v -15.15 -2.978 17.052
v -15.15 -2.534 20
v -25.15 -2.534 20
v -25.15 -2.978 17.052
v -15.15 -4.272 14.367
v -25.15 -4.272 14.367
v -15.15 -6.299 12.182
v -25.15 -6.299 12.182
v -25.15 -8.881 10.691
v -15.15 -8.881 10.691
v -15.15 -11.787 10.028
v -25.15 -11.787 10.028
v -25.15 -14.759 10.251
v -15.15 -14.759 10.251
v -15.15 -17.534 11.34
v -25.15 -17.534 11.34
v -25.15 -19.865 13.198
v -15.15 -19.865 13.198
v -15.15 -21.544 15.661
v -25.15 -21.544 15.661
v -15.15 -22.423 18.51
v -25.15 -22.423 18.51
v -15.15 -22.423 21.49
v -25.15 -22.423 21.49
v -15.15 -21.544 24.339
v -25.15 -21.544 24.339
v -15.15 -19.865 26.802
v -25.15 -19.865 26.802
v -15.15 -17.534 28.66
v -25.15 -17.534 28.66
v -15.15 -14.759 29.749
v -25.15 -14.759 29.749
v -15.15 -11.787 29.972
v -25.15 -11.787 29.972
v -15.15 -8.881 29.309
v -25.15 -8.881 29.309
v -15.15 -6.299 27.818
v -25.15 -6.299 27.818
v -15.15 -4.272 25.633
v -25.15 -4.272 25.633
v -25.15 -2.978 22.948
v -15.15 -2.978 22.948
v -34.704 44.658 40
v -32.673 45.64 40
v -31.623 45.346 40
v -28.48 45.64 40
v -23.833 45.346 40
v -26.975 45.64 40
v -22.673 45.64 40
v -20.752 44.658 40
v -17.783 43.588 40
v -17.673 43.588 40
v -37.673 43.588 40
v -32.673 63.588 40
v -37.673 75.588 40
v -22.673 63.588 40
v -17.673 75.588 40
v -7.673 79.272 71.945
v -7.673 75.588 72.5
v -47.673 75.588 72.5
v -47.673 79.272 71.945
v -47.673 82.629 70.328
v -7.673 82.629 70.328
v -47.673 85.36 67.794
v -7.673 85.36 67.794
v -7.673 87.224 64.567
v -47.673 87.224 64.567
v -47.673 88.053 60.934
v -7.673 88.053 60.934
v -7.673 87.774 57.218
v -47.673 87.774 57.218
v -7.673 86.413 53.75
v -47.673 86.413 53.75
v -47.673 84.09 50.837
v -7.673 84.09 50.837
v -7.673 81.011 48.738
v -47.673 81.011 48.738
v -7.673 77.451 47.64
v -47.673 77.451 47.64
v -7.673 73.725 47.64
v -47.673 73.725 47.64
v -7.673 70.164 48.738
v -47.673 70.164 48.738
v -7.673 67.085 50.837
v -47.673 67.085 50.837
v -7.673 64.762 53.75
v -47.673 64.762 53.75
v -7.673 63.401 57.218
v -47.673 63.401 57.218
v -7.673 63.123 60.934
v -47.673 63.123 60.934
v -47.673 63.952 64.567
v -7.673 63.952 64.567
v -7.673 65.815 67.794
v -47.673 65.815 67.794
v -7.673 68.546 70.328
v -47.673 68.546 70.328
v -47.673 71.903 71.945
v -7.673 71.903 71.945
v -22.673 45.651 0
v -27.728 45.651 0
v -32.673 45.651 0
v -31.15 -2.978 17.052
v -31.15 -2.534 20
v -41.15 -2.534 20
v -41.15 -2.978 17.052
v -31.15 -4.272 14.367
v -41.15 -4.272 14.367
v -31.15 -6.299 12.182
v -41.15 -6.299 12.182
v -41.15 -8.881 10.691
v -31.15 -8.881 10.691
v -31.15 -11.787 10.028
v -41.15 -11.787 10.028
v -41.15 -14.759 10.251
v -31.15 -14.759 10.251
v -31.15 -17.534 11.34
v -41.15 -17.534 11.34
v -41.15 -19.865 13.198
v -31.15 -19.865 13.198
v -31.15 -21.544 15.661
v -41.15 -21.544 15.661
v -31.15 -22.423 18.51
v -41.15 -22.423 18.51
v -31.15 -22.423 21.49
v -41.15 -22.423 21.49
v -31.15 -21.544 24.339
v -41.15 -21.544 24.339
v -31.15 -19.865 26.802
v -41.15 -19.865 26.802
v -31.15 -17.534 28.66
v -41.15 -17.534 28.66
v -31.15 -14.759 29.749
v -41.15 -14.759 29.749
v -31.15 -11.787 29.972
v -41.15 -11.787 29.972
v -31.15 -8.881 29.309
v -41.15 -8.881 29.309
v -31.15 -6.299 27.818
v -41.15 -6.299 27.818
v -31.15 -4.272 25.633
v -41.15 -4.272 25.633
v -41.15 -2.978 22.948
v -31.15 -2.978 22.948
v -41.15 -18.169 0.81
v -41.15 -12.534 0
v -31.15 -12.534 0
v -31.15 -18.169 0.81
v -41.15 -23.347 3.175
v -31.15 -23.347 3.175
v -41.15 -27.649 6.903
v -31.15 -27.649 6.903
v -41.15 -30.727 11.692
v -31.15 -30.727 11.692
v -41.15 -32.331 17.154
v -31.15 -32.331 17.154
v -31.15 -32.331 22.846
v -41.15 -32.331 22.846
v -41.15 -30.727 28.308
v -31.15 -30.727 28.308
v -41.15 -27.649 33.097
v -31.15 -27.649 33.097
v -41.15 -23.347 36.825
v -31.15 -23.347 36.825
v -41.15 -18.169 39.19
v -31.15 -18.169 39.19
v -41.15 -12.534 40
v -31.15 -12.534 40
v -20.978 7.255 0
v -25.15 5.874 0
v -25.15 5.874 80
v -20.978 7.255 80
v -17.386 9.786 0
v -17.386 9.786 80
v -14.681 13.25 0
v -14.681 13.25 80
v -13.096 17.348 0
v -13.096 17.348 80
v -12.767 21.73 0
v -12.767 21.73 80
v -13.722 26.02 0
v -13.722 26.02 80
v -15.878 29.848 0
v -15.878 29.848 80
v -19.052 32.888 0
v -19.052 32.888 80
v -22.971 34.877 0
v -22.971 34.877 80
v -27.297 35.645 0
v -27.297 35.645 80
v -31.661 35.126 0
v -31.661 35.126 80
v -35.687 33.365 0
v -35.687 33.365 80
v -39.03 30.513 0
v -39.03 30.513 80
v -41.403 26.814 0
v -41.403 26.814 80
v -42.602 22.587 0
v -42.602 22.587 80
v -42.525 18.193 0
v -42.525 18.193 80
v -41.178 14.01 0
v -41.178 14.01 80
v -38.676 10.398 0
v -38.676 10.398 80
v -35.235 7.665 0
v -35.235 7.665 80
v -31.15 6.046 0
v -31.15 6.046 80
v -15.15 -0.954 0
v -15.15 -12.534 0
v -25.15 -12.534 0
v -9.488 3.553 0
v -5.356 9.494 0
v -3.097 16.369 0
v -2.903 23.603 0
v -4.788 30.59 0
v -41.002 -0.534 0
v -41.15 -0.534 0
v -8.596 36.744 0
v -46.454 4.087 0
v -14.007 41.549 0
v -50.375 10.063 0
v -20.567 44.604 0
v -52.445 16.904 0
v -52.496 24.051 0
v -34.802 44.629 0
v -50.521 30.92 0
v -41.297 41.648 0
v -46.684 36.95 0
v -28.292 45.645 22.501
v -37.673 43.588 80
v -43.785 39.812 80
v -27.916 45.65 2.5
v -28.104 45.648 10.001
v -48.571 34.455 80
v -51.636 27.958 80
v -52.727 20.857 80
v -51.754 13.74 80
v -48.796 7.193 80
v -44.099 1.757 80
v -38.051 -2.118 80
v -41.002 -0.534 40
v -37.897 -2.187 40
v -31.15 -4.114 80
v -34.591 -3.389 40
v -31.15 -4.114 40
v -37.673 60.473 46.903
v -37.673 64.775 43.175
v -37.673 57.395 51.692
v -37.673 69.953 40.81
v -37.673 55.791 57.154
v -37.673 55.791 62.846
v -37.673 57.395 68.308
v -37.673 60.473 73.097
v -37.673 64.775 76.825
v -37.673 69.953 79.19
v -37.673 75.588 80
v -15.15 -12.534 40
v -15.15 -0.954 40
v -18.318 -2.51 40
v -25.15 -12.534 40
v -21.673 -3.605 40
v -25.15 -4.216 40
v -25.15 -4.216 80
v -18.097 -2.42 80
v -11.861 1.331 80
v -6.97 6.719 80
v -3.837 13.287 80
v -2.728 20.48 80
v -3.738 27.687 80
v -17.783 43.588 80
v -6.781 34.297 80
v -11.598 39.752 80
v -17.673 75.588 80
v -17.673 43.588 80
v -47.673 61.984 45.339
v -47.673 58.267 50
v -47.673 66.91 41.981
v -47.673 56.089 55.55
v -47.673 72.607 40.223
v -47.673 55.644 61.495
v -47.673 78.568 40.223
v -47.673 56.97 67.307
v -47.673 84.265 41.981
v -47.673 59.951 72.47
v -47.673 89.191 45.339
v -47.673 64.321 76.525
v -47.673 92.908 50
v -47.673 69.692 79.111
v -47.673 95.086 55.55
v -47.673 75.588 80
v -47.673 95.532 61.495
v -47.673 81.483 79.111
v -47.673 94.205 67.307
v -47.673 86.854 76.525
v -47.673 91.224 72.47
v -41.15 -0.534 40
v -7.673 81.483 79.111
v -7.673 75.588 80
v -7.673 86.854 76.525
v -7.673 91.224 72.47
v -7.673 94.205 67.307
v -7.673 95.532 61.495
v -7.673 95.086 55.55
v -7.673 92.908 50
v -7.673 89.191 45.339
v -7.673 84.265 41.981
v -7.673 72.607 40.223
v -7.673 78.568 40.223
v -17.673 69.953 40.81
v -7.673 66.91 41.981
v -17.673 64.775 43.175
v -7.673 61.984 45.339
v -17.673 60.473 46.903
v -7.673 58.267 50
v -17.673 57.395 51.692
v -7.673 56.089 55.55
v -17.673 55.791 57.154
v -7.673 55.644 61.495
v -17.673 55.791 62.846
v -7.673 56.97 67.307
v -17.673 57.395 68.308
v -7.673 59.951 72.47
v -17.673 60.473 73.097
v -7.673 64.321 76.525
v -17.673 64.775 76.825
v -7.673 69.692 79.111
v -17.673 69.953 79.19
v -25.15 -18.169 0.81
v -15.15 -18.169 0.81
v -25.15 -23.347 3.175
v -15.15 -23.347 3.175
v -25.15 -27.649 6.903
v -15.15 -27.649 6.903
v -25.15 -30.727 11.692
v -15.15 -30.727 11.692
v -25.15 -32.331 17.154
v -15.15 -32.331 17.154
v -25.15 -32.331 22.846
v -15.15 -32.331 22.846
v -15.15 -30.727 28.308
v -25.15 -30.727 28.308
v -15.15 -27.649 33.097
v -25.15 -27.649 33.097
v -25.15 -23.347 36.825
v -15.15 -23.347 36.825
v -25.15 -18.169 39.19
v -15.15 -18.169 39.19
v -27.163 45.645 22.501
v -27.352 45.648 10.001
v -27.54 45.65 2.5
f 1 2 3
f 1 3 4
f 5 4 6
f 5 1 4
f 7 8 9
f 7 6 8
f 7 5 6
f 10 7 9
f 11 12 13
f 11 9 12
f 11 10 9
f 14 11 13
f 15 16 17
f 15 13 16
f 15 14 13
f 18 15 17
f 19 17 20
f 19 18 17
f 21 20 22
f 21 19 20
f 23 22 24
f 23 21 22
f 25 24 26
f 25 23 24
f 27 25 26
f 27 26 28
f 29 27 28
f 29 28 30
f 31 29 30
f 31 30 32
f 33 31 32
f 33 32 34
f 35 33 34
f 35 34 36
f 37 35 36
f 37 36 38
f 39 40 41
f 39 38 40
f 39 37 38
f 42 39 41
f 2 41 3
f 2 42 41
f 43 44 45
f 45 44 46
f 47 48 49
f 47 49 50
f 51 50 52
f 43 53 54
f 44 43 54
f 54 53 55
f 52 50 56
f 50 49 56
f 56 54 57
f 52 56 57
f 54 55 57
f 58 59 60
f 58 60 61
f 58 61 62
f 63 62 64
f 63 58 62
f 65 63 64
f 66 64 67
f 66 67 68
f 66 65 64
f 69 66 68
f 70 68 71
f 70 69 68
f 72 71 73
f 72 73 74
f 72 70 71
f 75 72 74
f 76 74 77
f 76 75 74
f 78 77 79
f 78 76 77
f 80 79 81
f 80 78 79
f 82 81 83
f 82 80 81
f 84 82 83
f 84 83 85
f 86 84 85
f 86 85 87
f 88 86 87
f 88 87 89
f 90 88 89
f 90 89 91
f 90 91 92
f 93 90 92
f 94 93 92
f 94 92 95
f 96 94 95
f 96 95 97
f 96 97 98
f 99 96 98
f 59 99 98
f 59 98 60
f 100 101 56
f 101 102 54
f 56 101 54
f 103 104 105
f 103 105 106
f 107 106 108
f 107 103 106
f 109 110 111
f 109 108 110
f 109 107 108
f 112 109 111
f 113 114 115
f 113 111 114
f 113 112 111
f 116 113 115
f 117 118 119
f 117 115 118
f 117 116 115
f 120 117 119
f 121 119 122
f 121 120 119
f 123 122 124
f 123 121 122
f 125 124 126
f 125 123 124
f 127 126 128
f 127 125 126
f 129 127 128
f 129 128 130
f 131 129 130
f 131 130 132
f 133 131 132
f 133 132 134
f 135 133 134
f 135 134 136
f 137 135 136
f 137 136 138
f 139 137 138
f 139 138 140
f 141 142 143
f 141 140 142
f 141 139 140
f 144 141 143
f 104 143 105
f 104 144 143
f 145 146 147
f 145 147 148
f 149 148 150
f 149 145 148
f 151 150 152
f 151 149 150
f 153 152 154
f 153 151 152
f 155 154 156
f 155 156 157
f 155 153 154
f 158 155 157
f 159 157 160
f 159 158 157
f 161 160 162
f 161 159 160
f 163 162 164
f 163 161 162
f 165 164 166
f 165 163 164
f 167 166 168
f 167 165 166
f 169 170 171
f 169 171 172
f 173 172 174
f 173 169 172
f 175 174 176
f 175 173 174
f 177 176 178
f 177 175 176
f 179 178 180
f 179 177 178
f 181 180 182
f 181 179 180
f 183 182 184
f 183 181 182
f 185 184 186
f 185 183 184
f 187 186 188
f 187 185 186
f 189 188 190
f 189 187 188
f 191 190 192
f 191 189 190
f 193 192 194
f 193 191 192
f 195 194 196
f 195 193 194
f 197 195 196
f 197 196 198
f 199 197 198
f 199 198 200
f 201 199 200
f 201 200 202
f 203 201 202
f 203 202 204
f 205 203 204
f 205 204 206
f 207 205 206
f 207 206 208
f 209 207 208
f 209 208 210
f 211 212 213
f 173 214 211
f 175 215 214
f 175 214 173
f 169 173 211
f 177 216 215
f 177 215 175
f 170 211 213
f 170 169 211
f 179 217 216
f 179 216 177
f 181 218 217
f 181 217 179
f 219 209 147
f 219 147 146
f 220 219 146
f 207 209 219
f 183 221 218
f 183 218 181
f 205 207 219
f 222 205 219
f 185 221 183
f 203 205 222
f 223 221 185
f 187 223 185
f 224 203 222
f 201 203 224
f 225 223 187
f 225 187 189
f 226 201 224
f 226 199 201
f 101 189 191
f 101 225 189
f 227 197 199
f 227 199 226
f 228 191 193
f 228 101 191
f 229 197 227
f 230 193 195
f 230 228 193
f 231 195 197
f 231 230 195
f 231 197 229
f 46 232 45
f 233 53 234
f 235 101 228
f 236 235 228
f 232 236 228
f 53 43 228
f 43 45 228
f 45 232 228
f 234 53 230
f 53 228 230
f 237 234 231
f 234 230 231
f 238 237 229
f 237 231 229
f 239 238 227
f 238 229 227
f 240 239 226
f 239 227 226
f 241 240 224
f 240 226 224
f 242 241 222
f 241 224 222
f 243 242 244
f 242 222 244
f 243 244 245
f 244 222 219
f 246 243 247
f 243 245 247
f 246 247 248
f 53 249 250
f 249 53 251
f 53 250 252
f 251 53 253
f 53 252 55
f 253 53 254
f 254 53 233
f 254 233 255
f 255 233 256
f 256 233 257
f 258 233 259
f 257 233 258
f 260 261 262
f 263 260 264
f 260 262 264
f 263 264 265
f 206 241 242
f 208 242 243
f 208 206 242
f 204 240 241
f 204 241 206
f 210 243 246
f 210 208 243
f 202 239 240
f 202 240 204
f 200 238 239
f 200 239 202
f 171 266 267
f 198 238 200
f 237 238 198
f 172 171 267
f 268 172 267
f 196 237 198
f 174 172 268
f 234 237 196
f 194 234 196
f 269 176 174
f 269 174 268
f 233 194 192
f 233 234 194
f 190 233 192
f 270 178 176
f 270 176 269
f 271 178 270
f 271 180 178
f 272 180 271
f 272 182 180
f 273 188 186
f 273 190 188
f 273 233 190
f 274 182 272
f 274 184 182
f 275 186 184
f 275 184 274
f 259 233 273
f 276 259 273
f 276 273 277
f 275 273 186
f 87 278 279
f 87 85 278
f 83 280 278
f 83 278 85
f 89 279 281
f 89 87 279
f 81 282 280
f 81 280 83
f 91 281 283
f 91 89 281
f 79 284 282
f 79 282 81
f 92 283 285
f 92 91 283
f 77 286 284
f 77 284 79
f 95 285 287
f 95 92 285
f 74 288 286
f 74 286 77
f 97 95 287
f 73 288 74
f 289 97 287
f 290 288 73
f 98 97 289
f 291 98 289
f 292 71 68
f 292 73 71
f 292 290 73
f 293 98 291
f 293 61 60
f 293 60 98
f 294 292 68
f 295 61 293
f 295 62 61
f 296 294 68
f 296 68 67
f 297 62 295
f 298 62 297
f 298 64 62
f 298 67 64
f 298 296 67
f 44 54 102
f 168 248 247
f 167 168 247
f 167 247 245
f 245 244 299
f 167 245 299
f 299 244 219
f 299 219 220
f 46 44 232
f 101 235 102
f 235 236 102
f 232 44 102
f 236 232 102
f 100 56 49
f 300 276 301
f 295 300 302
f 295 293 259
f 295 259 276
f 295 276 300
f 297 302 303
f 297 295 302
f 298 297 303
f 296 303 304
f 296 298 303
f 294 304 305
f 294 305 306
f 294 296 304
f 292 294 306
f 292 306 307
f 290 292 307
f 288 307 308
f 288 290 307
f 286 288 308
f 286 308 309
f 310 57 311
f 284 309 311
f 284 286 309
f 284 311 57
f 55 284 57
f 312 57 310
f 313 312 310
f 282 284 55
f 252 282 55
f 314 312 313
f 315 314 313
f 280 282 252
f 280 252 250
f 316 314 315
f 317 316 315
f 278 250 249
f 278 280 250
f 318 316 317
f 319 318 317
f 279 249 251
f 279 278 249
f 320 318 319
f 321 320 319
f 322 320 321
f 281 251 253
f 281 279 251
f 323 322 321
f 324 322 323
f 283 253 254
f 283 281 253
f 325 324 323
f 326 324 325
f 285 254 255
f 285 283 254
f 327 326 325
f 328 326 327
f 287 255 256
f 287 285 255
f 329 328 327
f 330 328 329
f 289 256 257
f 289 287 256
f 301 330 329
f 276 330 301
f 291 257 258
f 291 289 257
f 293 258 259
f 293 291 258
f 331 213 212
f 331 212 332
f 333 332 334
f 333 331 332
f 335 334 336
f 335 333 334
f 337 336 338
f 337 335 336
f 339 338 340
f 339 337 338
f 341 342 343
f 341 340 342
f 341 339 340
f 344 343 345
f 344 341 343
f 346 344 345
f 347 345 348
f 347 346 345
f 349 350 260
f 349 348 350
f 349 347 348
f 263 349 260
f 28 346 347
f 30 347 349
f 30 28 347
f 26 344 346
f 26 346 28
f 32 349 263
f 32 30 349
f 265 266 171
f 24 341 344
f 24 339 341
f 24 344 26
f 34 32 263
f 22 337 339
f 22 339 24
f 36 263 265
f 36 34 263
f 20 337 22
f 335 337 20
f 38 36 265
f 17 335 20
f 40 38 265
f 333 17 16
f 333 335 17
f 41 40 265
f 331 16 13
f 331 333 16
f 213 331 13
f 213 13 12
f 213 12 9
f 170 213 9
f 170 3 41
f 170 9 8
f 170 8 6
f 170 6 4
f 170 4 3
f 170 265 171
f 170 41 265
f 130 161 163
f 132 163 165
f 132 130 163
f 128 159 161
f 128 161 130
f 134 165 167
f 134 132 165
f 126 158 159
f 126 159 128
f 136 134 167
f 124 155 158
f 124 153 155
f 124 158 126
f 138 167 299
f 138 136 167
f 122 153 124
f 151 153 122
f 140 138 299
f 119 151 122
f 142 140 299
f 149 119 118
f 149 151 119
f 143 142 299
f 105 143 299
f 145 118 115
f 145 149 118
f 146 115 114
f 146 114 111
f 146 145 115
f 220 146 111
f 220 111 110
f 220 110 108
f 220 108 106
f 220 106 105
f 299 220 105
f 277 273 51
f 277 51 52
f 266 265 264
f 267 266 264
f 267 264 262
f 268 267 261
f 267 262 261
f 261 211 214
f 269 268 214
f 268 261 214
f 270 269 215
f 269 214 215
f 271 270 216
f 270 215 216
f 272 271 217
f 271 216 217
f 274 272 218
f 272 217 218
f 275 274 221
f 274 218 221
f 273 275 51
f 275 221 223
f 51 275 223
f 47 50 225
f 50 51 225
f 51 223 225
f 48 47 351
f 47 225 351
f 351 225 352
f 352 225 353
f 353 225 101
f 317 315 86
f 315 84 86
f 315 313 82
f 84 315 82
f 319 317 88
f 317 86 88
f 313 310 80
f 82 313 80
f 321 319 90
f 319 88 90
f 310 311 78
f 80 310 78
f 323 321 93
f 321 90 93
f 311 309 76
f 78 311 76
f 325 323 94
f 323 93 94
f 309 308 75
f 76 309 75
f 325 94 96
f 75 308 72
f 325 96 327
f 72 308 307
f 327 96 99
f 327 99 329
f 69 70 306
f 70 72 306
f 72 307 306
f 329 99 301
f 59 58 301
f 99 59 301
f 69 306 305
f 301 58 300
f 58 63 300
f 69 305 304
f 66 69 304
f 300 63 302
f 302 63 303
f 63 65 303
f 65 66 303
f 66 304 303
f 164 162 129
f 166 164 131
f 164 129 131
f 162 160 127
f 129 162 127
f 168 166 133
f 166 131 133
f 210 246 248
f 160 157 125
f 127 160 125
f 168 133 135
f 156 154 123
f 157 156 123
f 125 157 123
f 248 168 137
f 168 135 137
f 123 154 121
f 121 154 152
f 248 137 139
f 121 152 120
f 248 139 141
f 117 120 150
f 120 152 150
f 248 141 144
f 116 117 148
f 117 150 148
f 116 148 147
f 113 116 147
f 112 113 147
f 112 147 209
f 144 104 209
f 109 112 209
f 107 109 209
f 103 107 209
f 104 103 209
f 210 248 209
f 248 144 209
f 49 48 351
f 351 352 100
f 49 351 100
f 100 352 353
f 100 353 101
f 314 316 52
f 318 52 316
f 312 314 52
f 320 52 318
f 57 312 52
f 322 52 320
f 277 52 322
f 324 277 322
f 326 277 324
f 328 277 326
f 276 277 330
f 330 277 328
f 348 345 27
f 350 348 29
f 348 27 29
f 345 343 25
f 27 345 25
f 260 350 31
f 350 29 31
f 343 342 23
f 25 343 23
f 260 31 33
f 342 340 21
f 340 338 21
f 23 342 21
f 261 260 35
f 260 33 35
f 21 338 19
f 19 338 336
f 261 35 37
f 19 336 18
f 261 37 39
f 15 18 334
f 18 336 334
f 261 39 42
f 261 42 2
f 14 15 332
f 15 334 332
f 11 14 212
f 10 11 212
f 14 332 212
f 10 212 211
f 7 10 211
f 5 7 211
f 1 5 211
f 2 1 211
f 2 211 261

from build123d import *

# Parameters (mm, degrees)
IZIM1_R                     = 25
IZIM1_R_2                   = 15
Y_KSEKLIK_EKSTR_ZYON1_DEPTH = 80
IZIM3_W                     = 26
IZIM3_H                     = 32
Y_KSEKLIK_EKSTR_ZYON3_DEPTH = 40
RADYUS2_RADIUS              = 20
RADYUS2_LENGTH              = 26
IZIM5_W                     = 6
IZIM5_H                     = 44.006307857
KES_EKSTR_ZYON1_DEPTH       = 107.133079222
KES_EKSTR_ZYON2_DEPTH       = 100.800958853
KES_EKSTR_ZYON2_DEPTH_BACK  = 100.800958853
IZIM7_R                     = 10
IZIM9_W                     = 20
IZIM9_H                     = 32
Y_KSEKLIK_EKSTR_ZYON4_DEPTH = 40
Y_KSEKLIK_EKSTR_ZYON5_DEPTH = 5
IZIM11_R                    = 20
IZIM11_R_2                  = 12.5
Y_KSEKLIK_EKSTR_ZYON6_DEPTH = 20
KES_EKSTR_ZYON3_DEPTH       = 130.453305469
KES_EKSTR_ZYON3_DEPTH_BACK  = 130.453305469
IZIM12_R                    = 12.5


with BuildPart() as part:
    # Çizim1 → Yükseklik-Ekstrüzyon1 (new body)
    with BuildSketch(Plane.XY):
        with Locations((-27.727849989, 20.650896384)):
            Circle(IZIM1_R)
        with Locations((-27.727849989, 20.650896384)):
            Circle(IZIM1_R_2, mode=Mode.SUBTRACT)
    extrude(amount=Y_KSEKLIK_EKSTR_ZYON1_DEPTH)

    # Çizim3 → Yükseklik-Ekstrüzyon3 (add)
    with BuildSketch(Plane(origin=(0, 0, 0), x_dir=(-1, 0, 0), z_dir=(0, 0, -1))):
        with Locations((28.149550203, -16.534219889)):
            Rectangle(IZIM3_W, IZIM3_H)
    extrude(amount=-Y_KSEKLIK_EKSTR_ZYON3_DEPTH)

    # Radyus2: full round fillet: the end face becomes a half cylinder, R = half its width
    radyus2_face = Plane((-28.149550203, -32.534219889, 20), x_dir=(-1, 0, 0), z_dir=(0, -1, 0))  # on the end face: x along it, z out of the body
    radyus2_slab = radyus2_face.offset(-RADYUS2_RADIUS / 2) * Box(RADYUS2_LENGTH, 2 * RADYUS2_RADIUS, RADYUS2_RADIUS, mode=Mode.PRIVATE)  # the body's end, R deep
    radyus2_round = Plane((-28.149550203, -12.534219889, 20), x_dir=(0, -1, 0), z_dir=(-1, 0, 0)) * Cylinder(RADYUS2_RADIUS, RADYUS2_LENGTH, mode=Mode.PRIVATE)  # its axis R under the face
    add(radyus2_slab - radyus2_round, mode=Mode.SUBTRACT)

    # Çizim5 → Kes-Ekstrüzyon1 (cut, through all)
    with BuildSketch(Plane(origin=(0, 0, 0), x_dir=(-1, 0, 0), z_dir=(0, 0, -1))):
        with Locations((28.149550203, -10.53106596)):
            Rectangle(IZIM5_W, IZIM5_H)
    extrude(amount=-KES_EKSTR_ZYON1_DEPTH, mode=Mode.SUBTRACT)

    # Çizim7 → Kes-Ekstrüzyon2 (cut, two sides: drawn at the far end of the back side and taken through both)
    with BuildSketch(Plane.ZY.offset(41.149550203).offset(-KES_EKSTR_ZYON2_DEPTH_BACK)):
        with Locations(Location((20, -12.534219889, 0), (0, 0, 90))):
            Circle(IZIM7_R)
    extrude(amount=KES_EKSTR_ZYON2_DEPTH + KES_EKSTR_ZYON2_DEPTH_BACK, mode=Mode.SUBTRACT)

    # Çizim9 → Yükseklik-Ekstrüzyon4 (add)
    with BuildSketch(Plane.XY.offset(80)):
        with Locations((-27.673094682, 59.587594228)):
            Rectangle(IZIM9_W, IZIM9_H)
    extrude(amount=-Y_KSEKLIK_EKSTR_ZYON4_DEPTH)

    # Çizim10 → Yükseklik-Ekstrüzyon5 (add, symmetric)
    with BuildSketch(Plane.ZY.offset(27.673094682)):
        Polygon((0, 45.650896384), (40, 63.587594228), (40, 45.639566476), align=None)
    extrude(amount=Y_KSEKLIK_EKSTR_ZYON5_DEPTH, both=True)

    # Çizim11 → Yükseklik-Ekstrüzyon6 (add, symmetric)
    with BuildSketch(Plane.ZY.offset(27.673094682)):
        with Locations((60, 75.587594228)):
            Circle(IZIM11_R)
        with Locations((60, 75.587594228)):
            Circle(IZIM11_R_2, mode=Mode.SUBTRACT)
    extrude(amount=Y_KSEKLIK_EKSTR_ZYON6_DEPTH, both=True)

    # Çizim12 → Kes-Ekstrüzyon3 (cut, two sides: drawn at the far end of the back side and taken through both)
    with BuildSketch(Plane.ZY.offset(37.673094682).offset(-KES_EKSTR_ZYON3_DEPTH_BACK)):
        with Locations((60, 75.587594228)):
            Circle(IZIM12_R)
    extrude(amount=KES_EKSTR_ZYON3_DEPTH + KES_EKSTR_ZYON3_DEPTH_BACK, mode=Mode.SUBTRACT)


solid = part.part
